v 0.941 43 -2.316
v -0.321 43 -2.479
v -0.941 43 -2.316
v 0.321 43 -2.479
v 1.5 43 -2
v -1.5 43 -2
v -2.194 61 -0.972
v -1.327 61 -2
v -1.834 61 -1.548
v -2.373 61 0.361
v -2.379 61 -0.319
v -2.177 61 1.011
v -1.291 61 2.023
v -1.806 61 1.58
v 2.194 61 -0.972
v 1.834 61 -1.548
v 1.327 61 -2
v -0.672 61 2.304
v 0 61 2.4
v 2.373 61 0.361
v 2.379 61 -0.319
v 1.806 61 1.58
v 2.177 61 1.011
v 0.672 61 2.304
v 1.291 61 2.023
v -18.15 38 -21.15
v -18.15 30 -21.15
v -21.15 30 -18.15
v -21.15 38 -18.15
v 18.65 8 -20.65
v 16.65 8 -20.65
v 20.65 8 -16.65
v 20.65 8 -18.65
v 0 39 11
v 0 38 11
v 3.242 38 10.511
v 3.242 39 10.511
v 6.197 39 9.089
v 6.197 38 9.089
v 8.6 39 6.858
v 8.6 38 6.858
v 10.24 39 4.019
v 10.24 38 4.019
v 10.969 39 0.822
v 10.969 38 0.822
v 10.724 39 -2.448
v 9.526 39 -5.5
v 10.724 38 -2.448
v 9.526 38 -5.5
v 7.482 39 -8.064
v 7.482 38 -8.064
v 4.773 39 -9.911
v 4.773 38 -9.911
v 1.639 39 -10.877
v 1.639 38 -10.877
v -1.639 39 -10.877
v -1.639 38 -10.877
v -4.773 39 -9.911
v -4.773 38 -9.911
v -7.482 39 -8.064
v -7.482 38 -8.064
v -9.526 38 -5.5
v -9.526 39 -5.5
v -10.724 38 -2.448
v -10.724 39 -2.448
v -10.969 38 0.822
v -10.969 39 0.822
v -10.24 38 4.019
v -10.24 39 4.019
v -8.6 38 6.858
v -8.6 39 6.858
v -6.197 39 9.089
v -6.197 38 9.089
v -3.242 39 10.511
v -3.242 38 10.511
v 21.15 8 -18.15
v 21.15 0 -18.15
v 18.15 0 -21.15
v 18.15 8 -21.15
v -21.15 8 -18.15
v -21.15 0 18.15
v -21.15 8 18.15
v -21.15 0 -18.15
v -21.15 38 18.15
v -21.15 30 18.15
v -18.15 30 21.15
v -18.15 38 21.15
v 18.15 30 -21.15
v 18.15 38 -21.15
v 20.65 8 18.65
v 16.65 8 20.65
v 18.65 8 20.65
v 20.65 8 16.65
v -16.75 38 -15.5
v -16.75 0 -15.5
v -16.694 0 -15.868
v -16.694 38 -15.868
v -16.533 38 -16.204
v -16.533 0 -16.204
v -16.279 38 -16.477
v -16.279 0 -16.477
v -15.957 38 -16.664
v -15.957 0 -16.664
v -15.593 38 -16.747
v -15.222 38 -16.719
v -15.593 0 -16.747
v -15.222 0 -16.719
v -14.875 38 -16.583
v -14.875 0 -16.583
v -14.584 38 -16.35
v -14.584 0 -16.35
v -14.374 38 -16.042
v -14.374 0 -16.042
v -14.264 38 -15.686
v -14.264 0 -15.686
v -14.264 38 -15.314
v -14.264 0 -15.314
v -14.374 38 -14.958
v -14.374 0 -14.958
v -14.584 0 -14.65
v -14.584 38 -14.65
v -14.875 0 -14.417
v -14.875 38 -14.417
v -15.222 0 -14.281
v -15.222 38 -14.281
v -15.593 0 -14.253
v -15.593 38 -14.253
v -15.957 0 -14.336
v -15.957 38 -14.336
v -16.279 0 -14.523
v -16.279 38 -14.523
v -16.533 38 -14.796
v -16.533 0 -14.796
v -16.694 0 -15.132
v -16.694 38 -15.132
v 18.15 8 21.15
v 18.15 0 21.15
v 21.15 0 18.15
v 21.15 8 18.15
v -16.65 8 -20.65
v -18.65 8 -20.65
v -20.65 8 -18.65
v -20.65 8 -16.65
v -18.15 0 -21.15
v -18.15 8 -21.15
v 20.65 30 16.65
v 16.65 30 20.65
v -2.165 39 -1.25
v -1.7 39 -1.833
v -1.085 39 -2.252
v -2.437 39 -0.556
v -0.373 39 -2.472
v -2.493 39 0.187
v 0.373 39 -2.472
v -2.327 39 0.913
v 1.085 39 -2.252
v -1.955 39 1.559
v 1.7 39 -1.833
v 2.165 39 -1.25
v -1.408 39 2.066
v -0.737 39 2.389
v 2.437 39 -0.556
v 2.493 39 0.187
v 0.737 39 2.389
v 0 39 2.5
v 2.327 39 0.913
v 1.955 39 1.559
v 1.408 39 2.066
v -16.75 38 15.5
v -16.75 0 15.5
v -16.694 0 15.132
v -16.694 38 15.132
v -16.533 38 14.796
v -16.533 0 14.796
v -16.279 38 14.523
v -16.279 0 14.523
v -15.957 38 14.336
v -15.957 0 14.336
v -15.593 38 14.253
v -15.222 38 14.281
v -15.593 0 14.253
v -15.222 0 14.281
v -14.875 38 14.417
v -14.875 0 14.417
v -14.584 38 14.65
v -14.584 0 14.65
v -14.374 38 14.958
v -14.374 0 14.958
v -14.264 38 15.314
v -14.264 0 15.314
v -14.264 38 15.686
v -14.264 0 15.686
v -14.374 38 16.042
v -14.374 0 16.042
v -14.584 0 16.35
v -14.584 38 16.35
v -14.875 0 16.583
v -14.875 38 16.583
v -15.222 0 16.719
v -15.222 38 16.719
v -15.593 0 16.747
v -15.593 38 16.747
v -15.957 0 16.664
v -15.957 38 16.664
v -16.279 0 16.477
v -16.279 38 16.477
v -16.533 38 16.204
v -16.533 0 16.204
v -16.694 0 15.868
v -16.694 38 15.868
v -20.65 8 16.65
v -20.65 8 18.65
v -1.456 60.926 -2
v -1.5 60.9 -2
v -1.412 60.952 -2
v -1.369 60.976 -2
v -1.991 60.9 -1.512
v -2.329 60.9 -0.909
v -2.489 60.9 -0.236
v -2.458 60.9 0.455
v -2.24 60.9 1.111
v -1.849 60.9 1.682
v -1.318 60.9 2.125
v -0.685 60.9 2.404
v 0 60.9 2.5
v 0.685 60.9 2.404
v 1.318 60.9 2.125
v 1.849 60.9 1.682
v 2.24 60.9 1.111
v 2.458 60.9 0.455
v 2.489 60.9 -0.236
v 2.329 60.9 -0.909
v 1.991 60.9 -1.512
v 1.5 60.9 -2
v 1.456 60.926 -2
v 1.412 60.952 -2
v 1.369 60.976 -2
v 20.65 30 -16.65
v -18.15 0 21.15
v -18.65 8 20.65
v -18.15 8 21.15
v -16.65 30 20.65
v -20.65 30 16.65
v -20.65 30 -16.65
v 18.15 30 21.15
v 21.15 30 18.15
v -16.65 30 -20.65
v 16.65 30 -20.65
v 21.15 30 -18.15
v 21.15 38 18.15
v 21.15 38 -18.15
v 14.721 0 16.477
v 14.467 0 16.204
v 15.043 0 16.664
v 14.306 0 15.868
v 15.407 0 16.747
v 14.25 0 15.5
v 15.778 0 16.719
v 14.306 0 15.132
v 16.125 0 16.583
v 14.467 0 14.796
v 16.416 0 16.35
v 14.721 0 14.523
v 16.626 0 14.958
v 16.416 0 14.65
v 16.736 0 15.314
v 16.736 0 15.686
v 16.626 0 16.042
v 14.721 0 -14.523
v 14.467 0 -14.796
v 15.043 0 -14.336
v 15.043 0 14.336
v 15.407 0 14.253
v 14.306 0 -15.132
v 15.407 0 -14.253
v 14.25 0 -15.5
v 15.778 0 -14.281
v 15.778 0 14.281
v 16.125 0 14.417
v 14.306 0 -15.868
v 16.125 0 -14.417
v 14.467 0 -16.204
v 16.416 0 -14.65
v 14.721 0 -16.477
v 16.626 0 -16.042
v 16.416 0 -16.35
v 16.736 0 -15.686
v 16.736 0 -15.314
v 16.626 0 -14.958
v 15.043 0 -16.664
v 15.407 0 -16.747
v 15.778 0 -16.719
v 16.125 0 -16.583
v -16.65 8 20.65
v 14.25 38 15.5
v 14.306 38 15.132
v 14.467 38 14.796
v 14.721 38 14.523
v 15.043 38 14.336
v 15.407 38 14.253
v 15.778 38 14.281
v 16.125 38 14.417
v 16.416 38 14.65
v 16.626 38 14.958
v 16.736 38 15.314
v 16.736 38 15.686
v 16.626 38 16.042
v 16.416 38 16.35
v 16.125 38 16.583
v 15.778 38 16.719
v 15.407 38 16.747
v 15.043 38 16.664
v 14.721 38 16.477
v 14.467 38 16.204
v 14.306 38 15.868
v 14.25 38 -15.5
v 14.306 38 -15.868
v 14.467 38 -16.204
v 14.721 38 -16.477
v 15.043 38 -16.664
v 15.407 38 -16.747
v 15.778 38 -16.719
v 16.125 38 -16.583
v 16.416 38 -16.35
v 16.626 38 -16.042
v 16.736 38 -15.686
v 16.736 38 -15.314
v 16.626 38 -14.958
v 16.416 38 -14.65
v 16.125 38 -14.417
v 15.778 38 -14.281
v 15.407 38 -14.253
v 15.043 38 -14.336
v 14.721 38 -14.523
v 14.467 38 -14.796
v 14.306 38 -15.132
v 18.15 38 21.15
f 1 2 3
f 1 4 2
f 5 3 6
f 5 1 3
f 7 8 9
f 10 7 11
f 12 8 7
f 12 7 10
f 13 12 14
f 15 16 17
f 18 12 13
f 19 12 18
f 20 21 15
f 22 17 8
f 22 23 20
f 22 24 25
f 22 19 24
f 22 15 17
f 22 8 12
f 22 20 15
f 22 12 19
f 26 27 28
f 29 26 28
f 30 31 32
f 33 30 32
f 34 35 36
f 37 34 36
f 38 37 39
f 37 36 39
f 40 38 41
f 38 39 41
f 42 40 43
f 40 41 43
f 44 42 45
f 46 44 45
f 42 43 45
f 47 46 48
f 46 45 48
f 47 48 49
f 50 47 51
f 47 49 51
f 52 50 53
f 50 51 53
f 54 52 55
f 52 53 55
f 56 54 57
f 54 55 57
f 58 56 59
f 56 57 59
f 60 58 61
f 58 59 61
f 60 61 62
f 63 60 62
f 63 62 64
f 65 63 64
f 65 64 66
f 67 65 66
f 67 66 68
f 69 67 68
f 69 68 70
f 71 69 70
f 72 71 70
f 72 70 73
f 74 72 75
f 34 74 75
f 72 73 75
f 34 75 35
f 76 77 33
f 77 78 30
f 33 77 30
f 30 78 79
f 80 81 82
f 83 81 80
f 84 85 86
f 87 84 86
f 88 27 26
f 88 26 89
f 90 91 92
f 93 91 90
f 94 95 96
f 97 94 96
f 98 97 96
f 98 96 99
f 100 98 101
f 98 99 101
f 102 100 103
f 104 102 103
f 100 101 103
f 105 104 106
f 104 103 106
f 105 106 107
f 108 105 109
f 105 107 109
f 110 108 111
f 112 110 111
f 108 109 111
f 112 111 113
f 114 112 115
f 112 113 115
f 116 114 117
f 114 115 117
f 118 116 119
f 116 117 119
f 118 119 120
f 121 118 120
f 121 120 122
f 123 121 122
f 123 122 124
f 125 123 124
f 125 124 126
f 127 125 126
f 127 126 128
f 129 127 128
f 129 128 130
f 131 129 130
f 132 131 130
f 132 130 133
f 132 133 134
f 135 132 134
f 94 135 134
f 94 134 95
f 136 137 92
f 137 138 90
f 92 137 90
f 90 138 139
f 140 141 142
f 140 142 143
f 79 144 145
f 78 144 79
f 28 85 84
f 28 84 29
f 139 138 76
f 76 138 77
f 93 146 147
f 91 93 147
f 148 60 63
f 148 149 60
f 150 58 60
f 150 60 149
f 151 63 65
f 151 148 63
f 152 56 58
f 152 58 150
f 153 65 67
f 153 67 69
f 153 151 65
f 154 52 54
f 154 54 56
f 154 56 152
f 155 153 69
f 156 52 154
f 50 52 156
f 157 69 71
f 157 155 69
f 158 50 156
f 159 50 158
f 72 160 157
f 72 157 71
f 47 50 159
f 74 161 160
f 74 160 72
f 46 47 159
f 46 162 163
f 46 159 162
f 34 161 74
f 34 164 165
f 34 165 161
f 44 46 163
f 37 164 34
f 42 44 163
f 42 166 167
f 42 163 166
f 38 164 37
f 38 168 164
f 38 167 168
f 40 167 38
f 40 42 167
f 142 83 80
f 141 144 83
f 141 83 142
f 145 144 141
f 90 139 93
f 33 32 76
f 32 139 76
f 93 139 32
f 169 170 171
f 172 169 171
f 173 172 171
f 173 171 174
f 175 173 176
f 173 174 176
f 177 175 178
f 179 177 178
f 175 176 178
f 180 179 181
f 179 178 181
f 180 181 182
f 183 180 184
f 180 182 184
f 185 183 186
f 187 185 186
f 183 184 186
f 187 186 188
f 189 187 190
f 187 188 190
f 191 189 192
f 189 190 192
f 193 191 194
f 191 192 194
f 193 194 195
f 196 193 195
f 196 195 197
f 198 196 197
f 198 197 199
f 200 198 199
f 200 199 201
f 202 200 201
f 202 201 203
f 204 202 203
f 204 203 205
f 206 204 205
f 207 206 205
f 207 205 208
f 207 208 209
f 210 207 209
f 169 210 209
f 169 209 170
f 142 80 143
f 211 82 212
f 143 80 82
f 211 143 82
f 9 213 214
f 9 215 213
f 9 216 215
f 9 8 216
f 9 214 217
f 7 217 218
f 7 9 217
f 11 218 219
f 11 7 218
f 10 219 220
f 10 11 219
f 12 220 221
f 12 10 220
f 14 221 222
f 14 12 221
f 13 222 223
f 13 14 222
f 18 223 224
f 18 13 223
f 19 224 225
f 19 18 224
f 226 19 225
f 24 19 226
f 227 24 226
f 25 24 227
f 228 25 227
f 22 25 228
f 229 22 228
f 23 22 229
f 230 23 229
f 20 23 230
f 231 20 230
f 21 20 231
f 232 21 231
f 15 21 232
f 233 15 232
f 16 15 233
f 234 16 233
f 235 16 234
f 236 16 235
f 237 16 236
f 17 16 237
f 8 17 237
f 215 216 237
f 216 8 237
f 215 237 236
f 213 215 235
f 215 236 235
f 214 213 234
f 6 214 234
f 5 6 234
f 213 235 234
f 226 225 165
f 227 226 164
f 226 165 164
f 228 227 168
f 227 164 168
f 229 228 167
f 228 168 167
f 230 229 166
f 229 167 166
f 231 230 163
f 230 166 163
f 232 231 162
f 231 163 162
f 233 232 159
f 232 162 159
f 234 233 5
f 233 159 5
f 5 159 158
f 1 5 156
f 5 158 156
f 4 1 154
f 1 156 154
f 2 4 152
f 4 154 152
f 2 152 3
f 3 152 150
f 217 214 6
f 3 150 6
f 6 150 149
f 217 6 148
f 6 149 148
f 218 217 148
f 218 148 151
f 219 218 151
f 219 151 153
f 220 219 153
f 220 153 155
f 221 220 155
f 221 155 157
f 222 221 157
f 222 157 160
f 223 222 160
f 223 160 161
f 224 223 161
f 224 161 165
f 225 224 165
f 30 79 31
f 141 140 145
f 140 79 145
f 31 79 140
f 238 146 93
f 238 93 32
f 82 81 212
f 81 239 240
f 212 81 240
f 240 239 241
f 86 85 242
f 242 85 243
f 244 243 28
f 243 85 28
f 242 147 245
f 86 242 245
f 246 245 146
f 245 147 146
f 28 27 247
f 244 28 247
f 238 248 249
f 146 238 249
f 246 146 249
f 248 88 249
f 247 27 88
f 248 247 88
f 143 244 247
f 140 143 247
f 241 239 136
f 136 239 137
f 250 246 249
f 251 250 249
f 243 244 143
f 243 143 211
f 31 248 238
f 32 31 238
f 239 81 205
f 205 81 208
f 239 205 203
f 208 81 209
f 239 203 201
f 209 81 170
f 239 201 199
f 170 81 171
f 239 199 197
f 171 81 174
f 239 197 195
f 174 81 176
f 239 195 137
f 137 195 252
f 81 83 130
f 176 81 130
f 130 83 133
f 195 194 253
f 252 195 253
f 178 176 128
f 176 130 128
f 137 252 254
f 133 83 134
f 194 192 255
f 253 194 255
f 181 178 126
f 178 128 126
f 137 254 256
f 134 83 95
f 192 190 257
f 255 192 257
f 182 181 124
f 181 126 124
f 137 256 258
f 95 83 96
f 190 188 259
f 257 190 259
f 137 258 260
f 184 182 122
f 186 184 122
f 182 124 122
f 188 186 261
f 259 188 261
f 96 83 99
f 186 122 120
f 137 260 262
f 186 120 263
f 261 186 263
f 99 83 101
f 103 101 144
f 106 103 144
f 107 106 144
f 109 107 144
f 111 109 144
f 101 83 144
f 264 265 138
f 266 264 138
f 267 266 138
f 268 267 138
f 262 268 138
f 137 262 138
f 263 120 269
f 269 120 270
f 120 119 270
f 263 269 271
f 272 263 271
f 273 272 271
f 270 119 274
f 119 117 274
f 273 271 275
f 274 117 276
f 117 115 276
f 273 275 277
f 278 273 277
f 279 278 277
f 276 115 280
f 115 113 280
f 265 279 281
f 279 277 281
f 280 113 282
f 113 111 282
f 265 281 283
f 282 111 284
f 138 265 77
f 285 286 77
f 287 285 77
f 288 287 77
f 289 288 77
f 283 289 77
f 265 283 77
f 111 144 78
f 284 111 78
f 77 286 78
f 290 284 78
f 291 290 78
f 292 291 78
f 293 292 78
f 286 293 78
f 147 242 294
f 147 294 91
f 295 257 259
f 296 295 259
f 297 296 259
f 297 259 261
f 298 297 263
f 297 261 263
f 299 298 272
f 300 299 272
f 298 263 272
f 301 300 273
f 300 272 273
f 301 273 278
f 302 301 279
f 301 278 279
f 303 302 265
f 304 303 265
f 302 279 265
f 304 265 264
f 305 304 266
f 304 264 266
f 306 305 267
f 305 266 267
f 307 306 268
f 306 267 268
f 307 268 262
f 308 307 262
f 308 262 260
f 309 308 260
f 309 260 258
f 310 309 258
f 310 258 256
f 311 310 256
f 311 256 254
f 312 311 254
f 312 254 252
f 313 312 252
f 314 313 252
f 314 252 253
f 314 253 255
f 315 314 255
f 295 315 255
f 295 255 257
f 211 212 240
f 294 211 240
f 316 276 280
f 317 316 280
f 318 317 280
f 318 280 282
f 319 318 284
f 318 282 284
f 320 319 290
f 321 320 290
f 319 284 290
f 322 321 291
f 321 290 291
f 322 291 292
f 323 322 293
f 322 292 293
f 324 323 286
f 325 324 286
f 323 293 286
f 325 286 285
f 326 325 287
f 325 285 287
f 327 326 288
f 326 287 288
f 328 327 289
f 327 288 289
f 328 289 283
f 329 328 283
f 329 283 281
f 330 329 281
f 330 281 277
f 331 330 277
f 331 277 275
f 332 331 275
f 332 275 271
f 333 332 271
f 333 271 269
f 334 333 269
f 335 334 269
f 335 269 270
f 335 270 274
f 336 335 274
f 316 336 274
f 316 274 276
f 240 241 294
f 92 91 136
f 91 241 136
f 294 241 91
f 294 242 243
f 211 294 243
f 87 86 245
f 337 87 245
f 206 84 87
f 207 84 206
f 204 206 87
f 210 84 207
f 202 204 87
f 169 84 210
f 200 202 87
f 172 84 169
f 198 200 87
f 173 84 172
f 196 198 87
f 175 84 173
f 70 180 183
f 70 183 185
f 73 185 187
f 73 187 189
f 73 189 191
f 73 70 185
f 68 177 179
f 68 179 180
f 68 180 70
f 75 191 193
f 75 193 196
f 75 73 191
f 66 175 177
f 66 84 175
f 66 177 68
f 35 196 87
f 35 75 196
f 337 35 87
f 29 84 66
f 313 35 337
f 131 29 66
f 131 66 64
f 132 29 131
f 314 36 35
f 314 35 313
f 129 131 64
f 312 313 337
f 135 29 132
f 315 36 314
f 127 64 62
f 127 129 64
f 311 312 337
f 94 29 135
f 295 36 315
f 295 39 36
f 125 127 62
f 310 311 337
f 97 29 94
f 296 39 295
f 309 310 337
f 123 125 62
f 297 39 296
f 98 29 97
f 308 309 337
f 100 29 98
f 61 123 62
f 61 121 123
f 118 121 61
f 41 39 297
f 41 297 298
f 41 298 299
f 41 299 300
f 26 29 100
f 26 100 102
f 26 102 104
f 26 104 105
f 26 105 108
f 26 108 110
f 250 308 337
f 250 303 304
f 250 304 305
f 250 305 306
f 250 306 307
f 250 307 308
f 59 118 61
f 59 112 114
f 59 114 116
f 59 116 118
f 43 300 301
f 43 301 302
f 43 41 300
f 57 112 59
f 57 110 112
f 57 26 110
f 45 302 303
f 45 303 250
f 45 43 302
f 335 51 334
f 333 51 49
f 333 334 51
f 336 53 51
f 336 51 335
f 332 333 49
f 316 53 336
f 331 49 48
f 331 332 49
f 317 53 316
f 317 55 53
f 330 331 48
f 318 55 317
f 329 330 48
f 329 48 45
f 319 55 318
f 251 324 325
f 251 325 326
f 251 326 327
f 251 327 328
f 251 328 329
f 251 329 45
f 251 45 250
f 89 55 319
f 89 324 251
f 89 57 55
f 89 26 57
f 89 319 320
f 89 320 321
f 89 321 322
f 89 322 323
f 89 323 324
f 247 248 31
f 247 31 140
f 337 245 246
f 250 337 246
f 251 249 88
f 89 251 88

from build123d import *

# Parameters (mm, degrees)
SKETCH_2_W               = 42.3
SKETCH_2_H               = 42.3
EXTRUDE_2_DEPTH          = 8
CHAMFER_1_SIZE           = 3
SKETCH_3_W               = 42.3
SKETCH_3_H               = 42.3
EXTRUDE_3_DEPTH          = 22
EXTRUDE_4_DEPTH          = 8
CUT_EXTRUDE_1_DEPTH      = 22
CUT_EXTRUDE_START        = -8
CUT_EXTRUDE_4_DEPTH      = 22
SKETCH_7_R               = 11
EXTRUDE_5_DEPTH          = 1
SKETCH_8_R               = 2.5
EXTRUDE_6_DEPTH          = 22
CUT_EXTRUDE_6_DEPTH      = 18
HOLE_WIZARD_M3_1_D       = 2.5
SKETCH_15_W              = 42.295221422
SKETCH_15_H              = 22.0000003
CUT_EXTRUDE_8_DEPTH      = 0.5
PATTERN_CIRCULAR_1_COUNT = 4
CHAMFER_3_SIZE           = 0.1


with BuildPart() as part:
    # 草图2 → 凸台-拉伸2 (new body)
    with BuildSketch(Plane(origin=(0, 0, 0), x_dir=(1, 0, 0), z_dir=(0, 1, 0))):
        Rectangle(SKETCH_2_W, SKETCH_2_H)
    extrude(amount=EXTRUDE_2_DEPTH)

    # 倒角1
    chamfer_1_edges = [part.edges().sort_by_distance(p)[0] for p in [
        (21.15, 4, 21.15),
        (-21.15, 4, 21.15),
        (-21.15, 4, -21.15),
        (21.15, 4, -21.15),
    ]]
    chamfer(chamfer_1_edges, length=CHAMFER_1_SIZE)

    # 草图3 → 凸台-拉伸3 (add)
    with BuildSketch(Plane(origin=(0, 8, 0), x_dir=(1, 0, 0), z_dir=(0, 1, 0))):
        Rectangle(SKETCH_3_W, SKETCH_3_H)
    extrude(amount=EXTRUDE_3_DEPTH)

    # 草图4 → 凸台-拉伸4 (add)
    with BuildSketch(Plane(origin=(0, 30, 0), x_dir=(1, 0, 0), z_dir=(0, 1, 0))):
        Polygon((-21.15, 18.15), (-21.15, -18.15), (-18.15, -21.15), (18.15, -21.15), (21.15, -18.15), (21.15, 18.15), (18.15, 21.15), (-18.15, 21.15), align=None)
    extrude(amount=EXTRUDE_4_DEPTH)

    # 草图5 → 切除-拉伸1 (cut)
    with BuildSketch(Plane(origin=(0, 30, 0), x_dir=(1, 0, 0), z_dir=(0, 1, 0))):
        Polygon((-16.15, 21.15), (-21.15, 21.15), (-21.15, 16.15), align=None)
    extrude(amount=-CUT_EXTRUDE_1_DEPTH, mode=Mode.SUBTRACT)

    # 草图6 → 切除-拉伸4 (cut)
    with BuildSketch(Plane(origin=(0, 38, 0), x_dir=(1, 0, 0), z_dir=(0, 1, 0)).offset(CUT_EXTRUDE_START)):
        Polygon((-16.15, -21.15), (-21.15, -16.15), (-21.15, -18.15), (-18.15, -21.15), align=None)
        Polygon((-18.15, -21.15), (-21.15, -18.15), (-21.15, -21.15), align=None)
        Polygon((21.15, -16.15), (16.15, -21.15), (18.15, -21.15), (21.15, -18.15), align=None)
        Polygon((21.15, -18.15), (18.15, -21.15), (21.15, -21.15), align=None)
        Polygon((18.15, 21.15), (16.15, 21.15), (21.15, 16.15), (21.15, 18.15), align=None)
        Polygon((21.15, 21.15), (18.15, 21.15), (21.15, 18.15), align=None)
    extrude(amount=-CUT_EXTRUDE_4_DEPTH, mode=Mode.SUBTRACT)

    # 草图7 → 凸台-拉伸5 (add)
    with BuildSketch(Plane(origin=(0, 38, 0), x_dir=(1, 0, 0), z_dir=(0, 1, 0))):
        with Locations(Location((0, 0, 0), (0, 0, 270))):
            Circle(SKETCH_7_R)
    extrude(amount=EXTRUDE_5_DEPTH)

    # 草图8 → 凸台-拉伸6 (add)
    with BuildSketch(Plane(origin=(0, 39, 0), x_dir=(1, 0, 0), z_dir=(0, 1, 0))):
        with Locations(Location((0, 0, 0), (0, 0, 270))):
            Circle(SKETCH_8_R)
    extrude(amount=EXTRUDE_6_DEPTH)

    # 草图9 → 切除-拉伸6 (cut)
    with BuildSketch(Plane(origin=(0, 61, 0), x_dir=(1, 0, 0), z_dir=(0, 1, 0))):
        Polygon((-76.274840795, 2), (-1.5, 2), (1.5, 2), (76.274840795, 2), (76.274840795, 151.54968159), (-76.274840795, 151.54968159), align=None)
    extrude(amount=-CUT_EXTRUDE_6_DEPTH, mode=Mode.SUBTRACT)

    # M3 螺纹孔1 (through all)
    with Locations(Plane(origin=(0, 38, 0), x_dir=(1, 0, 0), z_dir=(0, 1, 0))):
        with Locations((-15.5, 15.5), (15.5, 15.5), (15.5, -15.5), (-15.5, -15.5)):
            Hole(HOLE_WIZARD_M3_1_D / 2)

    # 草图15 → 切除-拉伸8 (cut)
    with BuildSketch(Plane.ZY.offset(21.15)):
        with Locations((-0.002389289, 18.99999985)):
            Rectangle(SKETCH_15_W, SKETCH_15_H)
    cut_extrude_8 = extrude(amount=-CUT_EXTRUDE_8_DEPTH, mode=Mode.SUBTRACT)

    # 阵列(圆周)1: 切除-拉伸8 ×4 about axis
    pattern_circular_1_axis = Axis((0, 0, 0), (0, 1, 0))
    for i in range(1, PATTERN_CIRCULAR_1_COUNT):
        add(cut_extrude_8.rotate(pattern_circular_1_axis, i * 360 / PATTERN_CIRCULAR_1_COUNT), mode=Mode.SUBTRACT)

    # 倒角3
    chamfer_3_edges = [part.edges().sort_by_distance(p)[0] for p in [
        (2.371708245, 61, 0.790569415),
    ]]
    chamfer(chamfer_3_edges, length=CHAMFER_3_SIZE)


solid = part.part
